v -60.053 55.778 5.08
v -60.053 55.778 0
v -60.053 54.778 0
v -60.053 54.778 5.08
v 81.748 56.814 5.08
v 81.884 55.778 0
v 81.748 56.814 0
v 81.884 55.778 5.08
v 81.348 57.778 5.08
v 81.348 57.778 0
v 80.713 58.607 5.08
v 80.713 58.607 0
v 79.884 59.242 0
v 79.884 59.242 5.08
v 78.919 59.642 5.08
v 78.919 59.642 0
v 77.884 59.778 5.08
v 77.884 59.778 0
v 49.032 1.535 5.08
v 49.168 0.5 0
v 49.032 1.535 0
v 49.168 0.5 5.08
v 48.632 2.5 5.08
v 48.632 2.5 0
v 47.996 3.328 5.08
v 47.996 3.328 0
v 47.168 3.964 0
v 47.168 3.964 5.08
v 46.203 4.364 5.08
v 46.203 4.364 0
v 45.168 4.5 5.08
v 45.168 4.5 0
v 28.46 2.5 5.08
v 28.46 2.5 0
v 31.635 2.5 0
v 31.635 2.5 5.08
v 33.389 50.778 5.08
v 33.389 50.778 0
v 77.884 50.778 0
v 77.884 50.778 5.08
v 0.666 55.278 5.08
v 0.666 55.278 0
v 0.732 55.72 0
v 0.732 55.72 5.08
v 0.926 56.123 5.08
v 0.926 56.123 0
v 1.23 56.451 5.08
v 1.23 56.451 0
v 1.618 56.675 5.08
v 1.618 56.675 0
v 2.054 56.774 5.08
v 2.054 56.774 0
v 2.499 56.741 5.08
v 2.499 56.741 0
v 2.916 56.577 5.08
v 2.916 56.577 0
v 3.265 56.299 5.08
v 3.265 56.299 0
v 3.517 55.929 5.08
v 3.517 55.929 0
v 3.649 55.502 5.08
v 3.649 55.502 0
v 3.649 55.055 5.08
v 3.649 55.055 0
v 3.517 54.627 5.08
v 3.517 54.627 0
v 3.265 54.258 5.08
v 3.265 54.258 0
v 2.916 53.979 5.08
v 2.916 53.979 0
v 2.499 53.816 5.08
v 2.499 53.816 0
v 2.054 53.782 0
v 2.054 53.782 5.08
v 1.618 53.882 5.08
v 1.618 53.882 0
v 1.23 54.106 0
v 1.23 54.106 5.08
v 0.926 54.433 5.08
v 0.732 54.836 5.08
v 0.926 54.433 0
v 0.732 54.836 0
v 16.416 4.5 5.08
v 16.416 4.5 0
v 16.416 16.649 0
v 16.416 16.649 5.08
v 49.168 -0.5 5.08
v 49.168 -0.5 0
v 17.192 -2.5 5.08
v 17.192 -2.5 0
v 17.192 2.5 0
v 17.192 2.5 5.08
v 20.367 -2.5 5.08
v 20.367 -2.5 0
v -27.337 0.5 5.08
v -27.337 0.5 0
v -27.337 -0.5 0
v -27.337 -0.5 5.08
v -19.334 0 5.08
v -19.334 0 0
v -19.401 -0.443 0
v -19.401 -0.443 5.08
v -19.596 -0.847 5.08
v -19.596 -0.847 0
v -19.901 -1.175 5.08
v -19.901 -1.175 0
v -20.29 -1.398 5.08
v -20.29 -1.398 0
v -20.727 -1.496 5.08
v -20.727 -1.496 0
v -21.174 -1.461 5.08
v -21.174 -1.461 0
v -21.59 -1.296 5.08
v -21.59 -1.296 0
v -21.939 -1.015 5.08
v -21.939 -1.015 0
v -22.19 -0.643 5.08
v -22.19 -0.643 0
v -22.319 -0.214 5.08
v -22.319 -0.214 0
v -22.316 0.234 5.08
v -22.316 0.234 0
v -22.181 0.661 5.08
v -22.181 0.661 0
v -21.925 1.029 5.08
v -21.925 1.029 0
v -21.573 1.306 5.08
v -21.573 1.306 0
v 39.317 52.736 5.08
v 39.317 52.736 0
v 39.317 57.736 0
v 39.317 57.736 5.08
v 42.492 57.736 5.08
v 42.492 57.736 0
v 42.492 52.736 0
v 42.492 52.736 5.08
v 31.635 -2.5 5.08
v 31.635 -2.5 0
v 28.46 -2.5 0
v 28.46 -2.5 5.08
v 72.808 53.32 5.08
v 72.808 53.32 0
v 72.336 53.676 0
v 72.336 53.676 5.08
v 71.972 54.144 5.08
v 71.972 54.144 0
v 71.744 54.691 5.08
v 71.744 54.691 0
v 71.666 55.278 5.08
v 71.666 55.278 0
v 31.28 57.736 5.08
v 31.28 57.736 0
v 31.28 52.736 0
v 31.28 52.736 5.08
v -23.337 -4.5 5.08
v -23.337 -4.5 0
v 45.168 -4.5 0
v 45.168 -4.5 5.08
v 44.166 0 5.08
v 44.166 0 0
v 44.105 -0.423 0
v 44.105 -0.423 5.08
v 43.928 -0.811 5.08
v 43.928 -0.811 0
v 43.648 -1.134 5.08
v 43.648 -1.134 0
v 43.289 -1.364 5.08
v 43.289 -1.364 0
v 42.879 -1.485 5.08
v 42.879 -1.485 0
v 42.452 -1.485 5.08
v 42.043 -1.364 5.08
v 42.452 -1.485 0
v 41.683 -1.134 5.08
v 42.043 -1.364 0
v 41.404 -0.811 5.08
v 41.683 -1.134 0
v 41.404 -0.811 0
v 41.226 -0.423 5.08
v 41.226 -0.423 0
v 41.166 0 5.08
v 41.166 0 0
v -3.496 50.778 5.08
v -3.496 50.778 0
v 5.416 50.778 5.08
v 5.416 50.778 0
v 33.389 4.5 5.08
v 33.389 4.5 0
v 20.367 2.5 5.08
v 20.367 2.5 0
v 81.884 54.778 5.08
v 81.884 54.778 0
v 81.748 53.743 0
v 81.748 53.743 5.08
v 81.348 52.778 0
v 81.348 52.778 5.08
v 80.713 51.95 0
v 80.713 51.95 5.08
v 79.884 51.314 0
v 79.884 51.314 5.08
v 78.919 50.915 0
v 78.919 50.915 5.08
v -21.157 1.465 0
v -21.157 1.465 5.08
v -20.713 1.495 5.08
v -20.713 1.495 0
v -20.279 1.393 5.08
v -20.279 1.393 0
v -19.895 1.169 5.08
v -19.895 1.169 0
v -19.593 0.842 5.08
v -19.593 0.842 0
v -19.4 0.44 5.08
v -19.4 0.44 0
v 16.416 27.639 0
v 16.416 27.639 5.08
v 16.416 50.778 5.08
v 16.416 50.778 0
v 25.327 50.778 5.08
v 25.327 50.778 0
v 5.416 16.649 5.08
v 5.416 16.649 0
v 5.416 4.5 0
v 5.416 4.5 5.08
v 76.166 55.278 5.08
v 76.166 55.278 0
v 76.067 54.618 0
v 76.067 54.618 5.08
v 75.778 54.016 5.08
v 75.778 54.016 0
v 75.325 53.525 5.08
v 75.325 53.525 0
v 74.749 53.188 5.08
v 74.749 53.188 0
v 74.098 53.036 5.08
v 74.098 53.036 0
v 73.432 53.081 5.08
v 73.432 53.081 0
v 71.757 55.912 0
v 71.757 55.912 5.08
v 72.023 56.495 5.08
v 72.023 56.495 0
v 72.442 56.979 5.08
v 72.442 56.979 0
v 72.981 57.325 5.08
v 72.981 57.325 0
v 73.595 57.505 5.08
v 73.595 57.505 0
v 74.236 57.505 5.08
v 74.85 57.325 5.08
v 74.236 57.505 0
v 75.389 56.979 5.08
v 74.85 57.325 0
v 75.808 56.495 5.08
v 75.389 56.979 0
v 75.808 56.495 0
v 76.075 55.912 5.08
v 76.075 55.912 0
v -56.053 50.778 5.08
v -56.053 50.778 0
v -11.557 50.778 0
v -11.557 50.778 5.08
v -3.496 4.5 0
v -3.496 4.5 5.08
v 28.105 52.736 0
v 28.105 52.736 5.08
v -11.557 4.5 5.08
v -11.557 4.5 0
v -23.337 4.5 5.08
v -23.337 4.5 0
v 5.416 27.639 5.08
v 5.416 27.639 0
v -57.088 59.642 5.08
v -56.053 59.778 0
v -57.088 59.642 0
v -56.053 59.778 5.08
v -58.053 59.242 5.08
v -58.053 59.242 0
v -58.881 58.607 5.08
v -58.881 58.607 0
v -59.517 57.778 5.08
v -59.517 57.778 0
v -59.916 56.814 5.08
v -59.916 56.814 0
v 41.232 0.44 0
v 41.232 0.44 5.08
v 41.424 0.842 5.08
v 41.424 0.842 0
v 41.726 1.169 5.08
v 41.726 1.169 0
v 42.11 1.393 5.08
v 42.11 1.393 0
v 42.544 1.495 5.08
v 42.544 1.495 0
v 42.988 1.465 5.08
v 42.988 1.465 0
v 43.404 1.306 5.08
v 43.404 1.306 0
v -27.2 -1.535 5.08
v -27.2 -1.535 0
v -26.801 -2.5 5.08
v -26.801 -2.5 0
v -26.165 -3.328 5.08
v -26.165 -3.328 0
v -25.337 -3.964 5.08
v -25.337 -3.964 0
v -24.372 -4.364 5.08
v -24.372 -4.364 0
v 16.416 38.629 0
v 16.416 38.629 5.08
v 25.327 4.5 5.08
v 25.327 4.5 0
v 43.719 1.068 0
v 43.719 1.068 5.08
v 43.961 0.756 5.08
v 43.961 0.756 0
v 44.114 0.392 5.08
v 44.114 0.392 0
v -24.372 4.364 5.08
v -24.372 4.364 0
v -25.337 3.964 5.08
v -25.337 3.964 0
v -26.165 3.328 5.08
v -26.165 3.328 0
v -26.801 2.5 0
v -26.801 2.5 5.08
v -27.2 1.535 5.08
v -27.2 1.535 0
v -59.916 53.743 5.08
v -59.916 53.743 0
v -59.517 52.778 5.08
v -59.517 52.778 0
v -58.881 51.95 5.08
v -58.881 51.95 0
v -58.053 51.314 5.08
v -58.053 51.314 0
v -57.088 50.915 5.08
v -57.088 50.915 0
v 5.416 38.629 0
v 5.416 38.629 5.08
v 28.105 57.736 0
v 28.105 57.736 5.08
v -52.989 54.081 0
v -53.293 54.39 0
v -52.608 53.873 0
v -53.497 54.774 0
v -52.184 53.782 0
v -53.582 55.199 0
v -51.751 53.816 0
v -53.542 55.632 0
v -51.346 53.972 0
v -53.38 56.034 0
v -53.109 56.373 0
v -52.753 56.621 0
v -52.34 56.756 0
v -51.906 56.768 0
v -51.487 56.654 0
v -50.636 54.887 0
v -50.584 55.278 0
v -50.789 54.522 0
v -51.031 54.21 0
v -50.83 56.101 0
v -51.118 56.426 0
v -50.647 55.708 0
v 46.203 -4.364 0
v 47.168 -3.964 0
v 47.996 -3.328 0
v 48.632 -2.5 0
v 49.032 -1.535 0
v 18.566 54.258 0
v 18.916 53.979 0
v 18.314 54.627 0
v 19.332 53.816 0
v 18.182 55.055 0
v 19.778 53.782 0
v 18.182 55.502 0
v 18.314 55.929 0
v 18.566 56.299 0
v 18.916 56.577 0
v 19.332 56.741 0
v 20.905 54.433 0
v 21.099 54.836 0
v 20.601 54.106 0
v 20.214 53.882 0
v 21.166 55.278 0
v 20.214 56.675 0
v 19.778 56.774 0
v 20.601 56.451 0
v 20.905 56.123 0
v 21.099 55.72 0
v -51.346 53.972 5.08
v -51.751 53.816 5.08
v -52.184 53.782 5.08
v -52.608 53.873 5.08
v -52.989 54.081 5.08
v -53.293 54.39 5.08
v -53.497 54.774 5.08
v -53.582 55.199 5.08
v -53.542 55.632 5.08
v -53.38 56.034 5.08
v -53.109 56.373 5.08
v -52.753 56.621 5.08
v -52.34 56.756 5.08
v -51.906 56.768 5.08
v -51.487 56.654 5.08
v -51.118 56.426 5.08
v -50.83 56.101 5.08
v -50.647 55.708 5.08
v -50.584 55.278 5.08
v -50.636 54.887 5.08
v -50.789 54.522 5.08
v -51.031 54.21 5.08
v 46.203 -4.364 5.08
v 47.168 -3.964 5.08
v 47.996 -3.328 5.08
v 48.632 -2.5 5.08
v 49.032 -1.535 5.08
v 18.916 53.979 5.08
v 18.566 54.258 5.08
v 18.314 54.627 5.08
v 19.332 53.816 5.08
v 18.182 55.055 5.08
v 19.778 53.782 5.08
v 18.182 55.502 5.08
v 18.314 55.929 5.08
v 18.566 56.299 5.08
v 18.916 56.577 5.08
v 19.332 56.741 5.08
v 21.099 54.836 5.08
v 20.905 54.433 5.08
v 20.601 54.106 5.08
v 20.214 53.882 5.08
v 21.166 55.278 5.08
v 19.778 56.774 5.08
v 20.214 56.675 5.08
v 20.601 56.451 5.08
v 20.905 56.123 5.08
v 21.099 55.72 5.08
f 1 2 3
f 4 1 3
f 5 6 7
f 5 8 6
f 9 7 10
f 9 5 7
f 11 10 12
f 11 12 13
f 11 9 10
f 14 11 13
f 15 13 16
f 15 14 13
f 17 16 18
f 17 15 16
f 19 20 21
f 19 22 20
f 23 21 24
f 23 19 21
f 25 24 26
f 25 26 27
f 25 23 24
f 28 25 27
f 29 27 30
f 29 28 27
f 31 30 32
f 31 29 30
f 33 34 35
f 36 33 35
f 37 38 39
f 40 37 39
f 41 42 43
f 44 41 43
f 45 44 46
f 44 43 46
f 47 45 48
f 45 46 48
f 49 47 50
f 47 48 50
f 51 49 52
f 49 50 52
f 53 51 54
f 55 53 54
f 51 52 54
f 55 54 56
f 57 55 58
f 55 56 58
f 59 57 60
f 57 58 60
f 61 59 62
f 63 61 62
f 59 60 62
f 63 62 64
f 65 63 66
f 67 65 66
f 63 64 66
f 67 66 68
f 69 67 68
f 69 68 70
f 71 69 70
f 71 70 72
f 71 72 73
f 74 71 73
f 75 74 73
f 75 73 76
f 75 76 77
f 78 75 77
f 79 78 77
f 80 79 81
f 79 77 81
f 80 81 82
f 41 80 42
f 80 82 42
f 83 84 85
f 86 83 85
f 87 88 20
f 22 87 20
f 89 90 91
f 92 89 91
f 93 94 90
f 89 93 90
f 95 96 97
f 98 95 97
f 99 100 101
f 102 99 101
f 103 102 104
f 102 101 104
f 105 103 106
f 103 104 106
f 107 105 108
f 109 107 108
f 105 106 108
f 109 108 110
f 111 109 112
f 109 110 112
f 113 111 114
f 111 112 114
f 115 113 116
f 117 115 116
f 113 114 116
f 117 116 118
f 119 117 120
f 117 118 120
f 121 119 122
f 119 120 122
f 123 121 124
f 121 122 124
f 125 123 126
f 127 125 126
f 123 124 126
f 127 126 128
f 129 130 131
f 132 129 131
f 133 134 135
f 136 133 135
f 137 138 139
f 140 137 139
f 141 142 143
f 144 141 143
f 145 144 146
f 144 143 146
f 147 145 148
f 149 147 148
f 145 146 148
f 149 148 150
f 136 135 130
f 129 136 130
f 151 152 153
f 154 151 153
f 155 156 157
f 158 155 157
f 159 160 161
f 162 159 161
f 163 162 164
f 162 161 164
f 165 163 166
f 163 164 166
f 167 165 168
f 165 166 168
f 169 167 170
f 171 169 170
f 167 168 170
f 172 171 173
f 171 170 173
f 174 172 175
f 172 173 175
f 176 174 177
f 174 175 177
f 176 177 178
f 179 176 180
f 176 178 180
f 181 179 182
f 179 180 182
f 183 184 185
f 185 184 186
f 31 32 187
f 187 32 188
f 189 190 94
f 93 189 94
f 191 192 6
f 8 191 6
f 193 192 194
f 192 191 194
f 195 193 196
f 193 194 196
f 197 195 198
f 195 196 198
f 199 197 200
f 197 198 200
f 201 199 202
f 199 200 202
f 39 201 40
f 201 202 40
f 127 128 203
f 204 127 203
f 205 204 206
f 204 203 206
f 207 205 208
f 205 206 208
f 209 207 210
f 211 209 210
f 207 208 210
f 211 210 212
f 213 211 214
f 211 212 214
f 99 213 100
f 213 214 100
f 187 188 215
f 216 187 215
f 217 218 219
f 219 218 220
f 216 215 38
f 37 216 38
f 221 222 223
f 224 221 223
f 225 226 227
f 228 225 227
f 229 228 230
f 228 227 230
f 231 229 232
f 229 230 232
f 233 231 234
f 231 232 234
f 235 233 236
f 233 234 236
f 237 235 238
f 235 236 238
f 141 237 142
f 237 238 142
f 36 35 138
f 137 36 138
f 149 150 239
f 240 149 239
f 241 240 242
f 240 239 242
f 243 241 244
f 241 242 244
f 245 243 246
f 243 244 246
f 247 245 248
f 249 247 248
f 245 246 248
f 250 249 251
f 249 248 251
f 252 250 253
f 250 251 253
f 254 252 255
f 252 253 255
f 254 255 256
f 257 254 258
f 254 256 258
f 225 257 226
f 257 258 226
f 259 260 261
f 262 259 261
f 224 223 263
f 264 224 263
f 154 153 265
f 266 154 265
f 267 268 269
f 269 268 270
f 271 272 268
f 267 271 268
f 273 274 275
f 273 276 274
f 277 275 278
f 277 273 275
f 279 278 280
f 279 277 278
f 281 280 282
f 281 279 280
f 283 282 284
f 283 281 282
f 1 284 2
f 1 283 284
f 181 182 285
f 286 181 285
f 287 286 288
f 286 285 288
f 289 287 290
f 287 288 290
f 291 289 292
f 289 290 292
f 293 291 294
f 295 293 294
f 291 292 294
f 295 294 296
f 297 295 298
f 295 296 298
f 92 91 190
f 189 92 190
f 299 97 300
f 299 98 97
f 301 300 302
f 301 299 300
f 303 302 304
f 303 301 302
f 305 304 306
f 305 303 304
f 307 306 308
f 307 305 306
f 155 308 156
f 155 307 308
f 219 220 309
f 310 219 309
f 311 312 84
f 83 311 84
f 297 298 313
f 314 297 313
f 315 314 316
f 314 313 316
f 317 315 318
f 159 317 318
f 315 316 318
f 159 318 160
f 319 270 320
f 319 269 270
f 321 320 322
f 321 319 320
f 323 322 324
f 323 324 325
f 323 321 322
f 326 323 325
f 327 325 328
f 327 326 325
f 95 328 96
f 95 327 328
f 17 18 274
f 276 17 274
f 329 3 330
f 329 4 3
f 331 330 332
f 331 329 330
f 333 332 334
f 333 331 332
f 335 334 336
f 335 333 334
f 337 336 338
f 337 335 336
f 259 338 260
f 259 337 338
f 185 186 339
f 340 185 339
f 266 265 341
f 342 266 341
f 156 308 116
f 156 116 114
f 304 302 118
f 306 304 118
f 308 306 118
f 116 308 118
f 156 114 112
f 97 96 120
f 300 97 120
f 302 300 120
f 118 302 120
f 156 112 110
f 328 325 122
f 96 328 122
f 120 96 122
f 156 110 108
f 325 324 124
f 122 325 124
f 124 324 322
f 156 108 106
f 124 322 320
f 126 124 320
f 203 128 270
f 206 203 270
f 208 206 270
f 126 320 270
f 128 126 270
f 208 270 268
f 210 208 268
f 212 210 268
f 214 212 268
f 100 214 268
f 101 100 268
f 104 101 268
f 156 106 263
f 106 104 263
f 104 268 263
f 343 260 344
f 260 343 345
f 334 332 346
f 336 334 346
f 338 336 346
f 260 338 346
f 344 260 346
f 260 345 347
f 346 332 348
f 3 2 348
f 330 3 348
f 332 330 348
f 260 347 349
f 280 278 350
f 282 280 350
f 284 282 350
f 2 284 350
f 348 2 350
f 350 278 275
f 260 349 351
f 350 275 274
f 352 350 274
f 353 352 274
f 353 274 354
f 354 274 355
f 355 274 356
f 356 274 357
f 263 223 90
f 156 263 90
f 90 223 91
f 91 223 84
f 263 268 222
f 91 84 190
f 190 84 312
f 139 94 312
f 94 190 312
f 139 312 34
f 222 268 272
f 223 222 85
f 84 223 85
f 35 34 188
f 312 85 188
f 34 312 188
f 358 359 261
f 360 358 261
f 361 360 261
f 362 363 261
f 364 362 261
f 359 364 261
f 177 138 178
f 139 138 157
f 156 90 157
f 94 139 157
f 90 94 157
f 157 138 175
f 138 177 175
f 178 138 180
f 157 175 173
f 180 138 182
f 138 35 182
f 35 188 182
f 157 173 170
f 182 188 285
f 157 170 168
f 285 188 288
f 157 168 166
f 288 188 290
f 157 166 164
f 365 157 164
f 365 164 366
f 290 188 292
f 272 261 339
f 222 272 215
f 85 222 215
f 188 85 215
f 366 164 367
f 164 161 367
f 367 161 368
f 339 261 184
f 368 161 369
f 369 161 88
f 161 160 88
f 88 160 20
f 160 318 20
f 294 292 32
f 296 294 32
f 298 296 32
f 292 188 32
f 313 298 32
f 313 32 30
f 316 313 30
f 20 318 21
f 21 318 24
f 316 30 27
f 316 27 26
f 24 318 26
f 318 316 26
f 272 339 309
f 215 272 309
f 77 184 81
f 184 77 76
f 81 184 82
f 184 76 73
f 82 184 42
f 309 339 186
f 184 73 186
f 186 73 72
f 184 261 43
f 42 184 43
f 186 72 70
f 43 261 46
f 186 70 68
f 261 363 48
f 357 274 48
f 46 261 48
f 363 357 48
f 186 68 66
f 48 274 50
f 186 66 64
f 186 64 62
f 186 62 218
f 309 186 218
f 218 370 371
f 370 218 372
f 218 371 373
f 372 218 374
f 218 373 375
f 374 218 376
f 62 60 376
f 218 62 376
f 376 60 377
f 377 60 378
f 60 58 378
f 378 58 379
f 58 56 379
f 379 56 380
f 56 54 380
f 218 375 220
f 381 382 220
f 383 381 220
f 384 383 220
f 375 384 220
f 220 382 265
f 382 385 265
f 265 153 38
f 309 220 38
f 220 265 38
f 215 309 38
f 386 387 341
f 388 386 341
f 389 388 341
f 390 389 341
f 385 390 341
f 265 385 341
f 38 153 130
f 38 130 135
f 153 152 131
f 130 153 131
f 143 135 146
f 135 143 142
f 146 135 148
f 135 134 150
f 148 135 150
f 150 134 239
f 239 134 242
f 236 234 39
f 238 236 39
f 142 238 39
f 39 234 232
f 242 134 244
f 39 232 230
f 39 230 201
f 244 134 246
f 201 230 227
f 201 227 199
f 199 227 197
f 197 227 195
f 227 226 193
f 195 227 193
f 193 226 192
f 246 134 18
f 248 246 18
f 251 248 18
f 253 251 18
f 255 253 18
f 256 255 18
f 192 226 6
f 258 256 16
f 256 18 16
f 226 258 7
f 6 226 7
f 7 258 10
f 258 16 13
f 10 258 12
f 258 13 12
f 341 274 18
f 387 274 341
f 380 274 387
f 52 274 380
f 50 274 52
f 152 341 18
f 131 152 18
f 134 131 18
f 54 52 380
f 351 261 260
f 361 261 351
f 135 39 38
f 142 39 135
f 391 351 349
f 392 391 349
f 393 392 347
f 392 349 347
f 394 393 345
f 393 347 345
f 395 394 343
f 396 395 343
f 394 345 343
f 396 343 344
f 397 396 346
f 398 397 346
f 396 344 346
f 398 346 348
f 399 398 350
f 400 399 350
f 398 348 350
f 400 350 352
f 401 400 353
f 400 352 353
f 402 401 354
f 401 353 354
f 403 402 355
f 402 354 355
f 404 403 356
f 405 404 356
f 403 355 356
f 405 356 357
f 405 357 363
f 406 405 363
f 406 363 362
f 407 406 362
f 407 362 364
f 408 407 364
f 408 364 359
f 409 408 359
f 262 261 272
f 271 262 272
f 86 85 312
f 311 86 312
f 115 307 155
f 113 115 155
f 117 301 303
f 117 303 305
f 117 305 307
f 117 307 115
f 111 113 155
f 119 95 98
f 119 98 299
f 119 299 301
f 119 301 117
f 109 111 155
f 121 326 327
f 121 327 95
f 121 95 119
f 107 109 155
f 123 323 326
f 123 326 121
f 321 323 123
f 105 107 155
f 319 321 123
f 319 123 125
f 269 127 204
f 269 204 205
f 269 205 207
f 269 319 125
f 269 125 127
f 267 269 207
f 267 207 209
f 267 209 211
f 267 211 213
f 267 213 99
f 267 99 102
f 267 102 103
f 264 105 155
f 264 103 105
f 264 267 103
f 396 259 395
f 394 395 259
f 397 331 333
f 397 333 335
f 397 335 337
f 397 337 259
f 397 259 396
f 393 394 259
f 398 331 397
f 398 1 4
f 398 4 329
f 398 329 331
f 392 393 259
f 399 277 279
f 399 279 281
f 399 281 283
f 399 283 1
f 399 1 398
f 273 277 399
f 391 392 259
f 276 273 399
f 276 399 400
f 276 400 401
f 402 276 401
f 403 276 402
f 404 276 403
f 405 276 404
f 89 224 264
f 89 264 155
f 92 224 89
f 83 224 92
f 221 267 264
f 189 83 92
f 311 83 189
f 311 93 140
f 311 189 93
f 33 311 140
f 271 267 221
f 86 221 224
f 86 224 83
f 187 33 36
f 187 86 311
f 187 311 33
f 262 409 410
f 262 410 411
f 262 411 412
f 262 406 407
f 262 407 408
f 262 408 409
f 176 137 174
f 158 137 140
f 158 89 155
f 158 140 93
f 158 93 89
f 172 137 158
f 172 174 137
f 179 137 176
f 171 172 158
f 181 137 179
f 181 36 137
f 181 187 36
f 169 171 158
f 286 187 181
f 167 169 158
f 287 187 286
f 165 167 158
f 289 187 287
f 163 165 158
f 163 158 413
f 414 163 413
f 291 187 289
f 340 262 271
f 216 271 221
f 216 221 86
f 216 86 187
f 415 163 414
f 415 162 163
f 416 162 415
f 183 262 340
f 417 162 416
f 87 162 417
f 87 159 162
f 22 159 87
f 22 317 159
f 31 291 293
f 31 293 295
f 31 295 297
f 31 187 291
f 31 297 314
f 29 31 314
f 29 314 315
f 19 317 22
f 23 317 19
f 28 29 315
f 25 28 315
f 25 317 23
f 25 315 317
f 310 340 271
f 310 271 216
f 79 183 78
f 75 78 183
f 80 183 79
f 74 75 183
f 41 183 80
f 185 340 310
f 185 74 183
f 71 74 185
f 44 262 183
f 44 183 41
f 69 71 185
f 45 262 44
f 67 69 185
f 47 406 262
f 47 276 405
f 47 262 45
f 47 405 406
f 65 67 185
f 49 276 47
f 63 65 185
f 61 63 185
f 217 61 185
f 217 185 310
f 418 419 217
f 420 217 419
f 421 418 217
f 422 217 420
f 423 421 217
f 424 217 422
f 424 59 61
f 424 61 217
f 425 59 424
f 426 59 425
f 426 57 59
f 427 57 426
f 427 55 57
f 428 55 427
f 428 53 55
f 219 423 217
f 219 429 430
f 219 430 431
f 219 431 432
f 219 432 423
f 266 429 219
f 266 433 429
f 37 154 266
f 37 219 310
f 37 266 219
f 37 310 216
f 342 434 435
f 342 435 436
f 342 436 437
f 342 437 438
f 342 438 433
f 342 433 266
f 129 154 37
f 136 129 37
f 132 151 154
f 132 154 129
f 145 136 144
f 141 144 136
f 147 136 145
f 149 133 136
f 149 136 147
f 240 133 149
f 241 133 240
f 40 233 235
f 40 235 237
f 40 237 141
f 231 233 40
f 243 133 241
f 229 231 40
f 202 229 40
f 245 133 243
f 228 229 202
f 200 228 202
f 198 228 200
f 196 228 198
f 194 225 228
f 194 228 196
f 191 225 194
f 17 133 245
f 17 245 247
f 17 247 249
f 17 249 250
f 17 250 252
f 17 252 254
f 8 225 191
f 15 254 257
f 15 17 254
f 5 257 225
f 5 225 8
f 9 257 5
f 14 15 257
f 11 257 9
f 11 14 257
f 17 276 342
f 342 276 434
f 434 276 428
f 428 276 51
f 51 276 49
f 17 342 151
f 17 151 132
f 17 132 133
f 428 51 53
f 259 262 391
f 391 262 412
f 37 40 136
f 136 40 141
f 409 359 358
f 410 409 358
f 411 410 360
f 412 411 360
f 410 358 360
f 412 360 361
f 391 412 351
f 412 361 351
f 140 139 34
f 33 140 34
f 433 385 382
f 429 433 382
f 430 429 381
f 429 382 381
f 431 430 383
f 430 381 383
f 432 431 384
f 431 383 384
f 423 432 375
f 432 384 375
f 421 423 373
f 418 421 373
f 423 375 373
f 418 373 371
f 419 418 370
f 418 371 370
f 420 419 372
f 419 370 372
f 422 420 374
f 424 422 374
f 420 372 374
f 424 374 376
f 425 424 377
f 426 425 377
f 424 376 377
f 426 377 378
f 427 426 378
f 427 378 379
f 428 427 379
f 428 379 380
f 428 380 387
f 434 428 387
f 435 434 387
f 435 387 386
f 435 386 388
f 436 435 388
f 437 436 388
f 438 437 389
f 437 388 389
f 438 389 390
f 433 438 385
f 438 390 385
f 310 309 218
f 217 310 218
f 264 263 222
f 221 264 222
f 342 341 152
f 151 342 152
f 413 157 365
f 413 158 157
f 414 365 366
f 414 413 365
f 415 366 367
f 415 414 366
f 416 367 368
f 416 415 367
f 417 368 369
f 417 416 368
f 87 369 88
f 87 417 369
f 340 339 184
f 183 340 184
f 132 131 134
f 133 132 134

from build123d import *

# Parameters (mm, degrees)
F1_DEPTH = 5.08
F2_R     = 4


# Not quite as in the source:
# - a feature names something its author has since deleted; it is built from what else it names


with BuildPart() as f1:
    # F0 (on Top) → F1 (new body)
    with BuildSketch(Plane.XY):
        with BuildLine():
            Line((0.6656670719, 55.2782733088), (-50.5843329281, 55.2782733088))
            ThreePointArc((-50.5843329281, 55.2782733088), (-50.7887088575, 54.5223908657), (-51.3461439517, 53.9724873251))
            Line((-51.3461439517, 53.9724873251), (-49.5403858838, 50.7782733088))
            Line((-49.5403858838, 50.7782733088), (-11.5572661318, 50.7782733088))
            Line((-11.5572661318, 50.7782733088), (-3.4960969558, 50.7782733088))
            Line((-3.4960969558, 50.7782733088), (5.4156670719, 50.7782733088))
            Line((5.4156670719, 50.7782733088), (10.9156670719, 50.7782733088))
            Line((10.9156670719, 50.7782733088), (10.9156670719, 55.2782733088))
            Line((10.9156670719, 55.2782733088), (3.6656670719, 55.2782733088))
            ThreePointArc((3.6656670719, 55.2782733088), (2.1656670719, 53.7782733088), (0.6656670719, 55.2782733088))
        make_face()
        with BuildLine():
            Line((-11.5572661318, 4.5), (-23.3782799724, 4.5))
            Line((-23.3782799724, 4.5), (-21.5725219045, 1.3057859837))
            ThreePointArc((-21.5725219045, 1.3057859837), (-20.0784504851, 1.2956240706), (-19.3343329281, 0))
            Line((-19.3343329281, 0), (10.9156670719, 0))
            Line((10.9156670719, 0), (10.9156670719, 4.5))
            Line((10.9156670719, 4.5), (5.4156670719, 4.5))
            Line((5.4156670719, 4.5), (-3.4960969558, 4.5))
            Line((-3.4960969558, 4.5), (-11.5572661318, 4.5))
        make_face()
        with BuildLine():
            ThreePointArc((-51.3461439517, 53.9724873251), (-53.3799569987, 56.0341557518), (-50.5843329281, 55.2782733088))
            Line((-50.5843329281, 55.2782733088), (0.6656670719, 55.2782733088))
            ThreePointArc((0.6656670719, 55.2782733088), (2.1656670719, 56.7782733088), (3.6656670719, 55.2782733088))
            Line((3.6656670719, 55.2782733088), (10.9156670719, 55.2782733088))
            Line((10.9156670719, 55.2782733088), (18.1656670719, 55.2782733088))
            ThreePointArc((18.1656670719, 55.2782733088), (19.6656670719, 56.7782733088), (21.1656670719, 55.2782733088))
            Line((21.1656670719, 55.2782733088), (28.1048402488, 55.2782733088))
            Line((28.1048402488, 55.2782733088), (28.1048402488, 57.7362733088))
            Line((28.1048402488, 57.7362733088), (31.2798402488, 57.7362733088))
            Line((31.2798402488, 57.7362733088), (31.2798402488, 55.2782733088))
            Line((31.2798402488, 55.2782733088), (39.3168402488, 55.2782733088))
            Line((39.3168402488, 55.2782733088), (39.3168402488, 57.7362733088))
            Line((39.3168402488, 57.7362733088), (42.4918402488, 57.7362733088))
            Line((42.4918402488, 57.7362733088), (42.4918402488, 55.2782733088))
            Line((42.4918402488, 55.2782733088), (71.6656670719, 55.2782733088))
            ThreePointArc((71.6656670719, 55.2782733088), (73.9156670719, 57.5282733088), (76.1656670719, 55.2782733088))
            ThreePointArc((76.1656670719, 55.2782733088), (75.0494907365, 53.3348372029), (72.8083836073, 53.3195943333))
            Line((72.8083836073, 53.3195943333), (71.3717200276, 50.7782733088))
            Line((71.3717200276, 50.7782733088), (81.8841302488, 50.7782733088))
            Line((81.8841302488, 50.7782733088), (81.8841302488, 59.7782733088))
            Line((81.8841302488, 59.7782733088), (-60.052796105, 59.7782733088))
            Line((-60.052796105, 59.7782733088), (-60.052796105, 50.7782733088))
            Line((-60.052796105, 50.7782733088), (-49.5403858838, 50.7782733088))
            Line((-49.5403858838, 50.7782733088), (-51.3461439517, 53.9724873251))
        make_face()
        with BuildLine():
            Line((-21.5725219045, 1.3057859837), (-23.3782799724, 4.5))
            Line((-23.3782799724, 4.5), (-27.3365851734, 4.5))
            Line((-27.3365851734, 4.5), (-27.3365851734, -4.5))
            Line((-27.3365851734, -4.5), (49.1679193172, -4.5))
            Line((49.1679193172, -4.5), (49.1679193172, 4.5))
            Line((49.1679193172, 4.5), (45.2096141162, 4.5))
            Line((45.2096141162, 4.5), (43.4038560483, 1.3057859837))
            ThreePointArc((43.4038560483, 1.3057859837), (43.9612911425, 0.7558824431), (44.1656670719, 0))
            ThreePointArc((44.1656670719, 0), (42.6656670719, -1.5), (41.1656670719, 0))
            Line((41.1656670719, 0), (31.6349193172, 0))
            Line((31.6349193172, 0), (31.6349193172, -2.5))
            Line((31.6349193172, -2.5), (28.4599193172, -2.5))
            Line((28.4599193172, -2.5), (28.4599193172, 0))
            Line((28.4599193172, 0), (20.3669193172, 0))
            Line((20.3669193172, 0), (20.3669193172, -2.5))
            Line((20.3669193172, -2.5), (17.1919193172, -2.5))
            Line((17.1919193172, -2.5), (17.1919193172, 0))
            Line((17.1919193172, 0), (10.9156670719, 0))
            Line((10.9156670719, 0), (-19.3343329281, 0))
            ThreePointArc((-19.3343329281, 0), (-21.5902153712, -1.2956240706), (-21.5725219045, 1.3057859837))
        make_face()
        with BuildLine():
            Line((10.9156670719, 4.5), (10.9156670719, 0))
            Line((10.9156670719, 0), (17.1919193172, 0))
            Line((17.1919193172, 0), (17.1919193172, 2.5))
            Line((17.1919193172, 2.5), (20.3669193172, 2.5))
            Line((20.3669193172, 2.5), (20.3669193172, 0))
            Line((20.3669193172, 0), (28.4599193172, 0))
            Line((28.4599193172, 0), (28.4599193172, 2.5))
            Line((28.4599193172, 2.5), (31.6349193172, 2.5))
            Line((31.6349193172, 2.5), (31.6349193172, 0))
            Line((31.6349193172, 0), (41.1656670719, 0))
            ThreePointArc((41.1656670719, 0), (41.9097846288, 1.2956240706), (43.4038560483, 1.3057859837))
            Line((43.4038560483, 1.3057859837), (45.2096141162, 4.5))
            Line((45.2096141162, 4.5), (33.3886002756, 4.5))
            Line((33.3886002756, 4.5), (25.3274310996, 4.5))
            Line((25.3274310996, 4.5), (16.4156670719, 4.5))
            Line((16.4156670719, 4.5), (10.9156670719, 4.5))
        make_face()
        with BuildLine():
            Line((18.1656670719, 55.2782733088), (10.9156670719, 55.2782733088))
            Line((10.9156670719, 55.2782733088), (10.9156670719, 50.7782733088))
            Line((10.9156670719, 50.7782733088), (16.4156670719, 50.7782733088))
            Line((16.4156670719, 50.7782733088), (25.3274310996, 50.7782733088))
            Line((25.3274310996, 50.7782733088), (33.3886002756, 50.7782733088))
            Line((33.3886002756, 50.7782733088), (71.3717200276, 50.7782733088))
            Line((71.3717200276, 50.7782733088), (72.8083836073, 53.3195943333))
            ThreePointArc((72.8083836073, 53.3195943333), (71.972230966, 54.1444496442), (71.6656670719, 55.2782733088))
            Line((71.6656670719, 55.2782733088), (42.4918402488, 55.2782733088))
            Line((42.4918402488, 55.2782733088), (42.4918402488, 52.7362733088))
            Line((42.4918402488, 52.7362733088), (39.3168402488, 52.7362733088))
            Line((39.3168402488, 52.7362733088), (39.3168402488, 55.2782733088))
            Line((39.3168402488, 55.2782733088), (31.2798402488, 55.2782733088))
            Line((31.2798402488, 55.2782733088), (31.2798402488, 52.7362733088))
            Line((31.2798402488, 52.7362733088), (28.1048402488, 52.7362733088))
            Line((28.1048402488, 52.7362733088), (28.1048402488, 55.2782733088))
            Line((28.1048402488, 55.2782733088), (21.1656670719, 55.2782733088))
            ThreePointArc((21.1656670719, 55.2782733088), (19.6656670719, 53.7782733088), (18.1656670719, 55.2782733088))
        make_face()
        Polygon((5.4156670719, 38.6288985841), (5.4156670719, 27.6391366544), (10.9156670719, 27.6391366544), (10.9156670719, 50.7782733088), (5.4156670719, 50.7782733088), align=None)
        Polygon((10.9156670719, 27.6391366544), (5.4156670719, 27.6391366544), (5.4156670719, 16.6493747247), (5.4156670719, 4.5), (10.9156670719, 4.5), align=None)
        Polygon((16.4156670719, 50.7782733088), (10.9156670719, 50.7782733088), (10.9156670719, 27.6391366544), (16.4156670719, 27.6391366544), (16.4156670719, 38.6288985841), align=None)
        Polygon((16.4156670719, 27.6391366544), (10.9156670719, 27.6391366544), (10.9156670719, 4.5), (16.4156670719, 4.5), (16.4156670719, 16.6493747247), align=None)
        Polygon((-3.4960969558, 50.7782733088), (-11.5572661318, 50.7782733088), (5.4156670719, 27.6391366544), (5.4156670719, 38.6288985841), align=None)
        Polygon((5.4156670719, 27.6391366544), (-11.5572661318, 4.5), (-3.4960969558, 4.5), (5.4156670719, 16.6493747247), align=None)
        Polygon((33.3886002756, 4.5), (16.4156670719, 27.6391366544), (16.4156670719, 16.6493747247), (25.3274310996, 4.5), align=None)
        Polygon((16.4156670719, 38.6288985841), (16.4156670719, 27.6391366544), (33.3886002756, 50.7782733088), (25.3274310996, 50.7782733088), align=None)
    extrude(amount=F1_DEPTH)

    # F2
    f2_edges = [f1.edges().sort_by_distance(p)[0] for p in [
        (-60.052796, 59.778273, 2.54),
        (-60.052796, 50.778273, 2.54),
        (81.88413, 59.778273, 2.54),
        (81.88413, 50.778273, 2.54),
        (49.167919, 4.5, 2.54),
        (49.167919, -4.5, 2.54),
        (-27.336585, 4.5, 2.54),
        (-27.336585, -4.5, 2.54),
    ]]
    fillet(f2_edges, radius=F2_R)


solid = f1.part
